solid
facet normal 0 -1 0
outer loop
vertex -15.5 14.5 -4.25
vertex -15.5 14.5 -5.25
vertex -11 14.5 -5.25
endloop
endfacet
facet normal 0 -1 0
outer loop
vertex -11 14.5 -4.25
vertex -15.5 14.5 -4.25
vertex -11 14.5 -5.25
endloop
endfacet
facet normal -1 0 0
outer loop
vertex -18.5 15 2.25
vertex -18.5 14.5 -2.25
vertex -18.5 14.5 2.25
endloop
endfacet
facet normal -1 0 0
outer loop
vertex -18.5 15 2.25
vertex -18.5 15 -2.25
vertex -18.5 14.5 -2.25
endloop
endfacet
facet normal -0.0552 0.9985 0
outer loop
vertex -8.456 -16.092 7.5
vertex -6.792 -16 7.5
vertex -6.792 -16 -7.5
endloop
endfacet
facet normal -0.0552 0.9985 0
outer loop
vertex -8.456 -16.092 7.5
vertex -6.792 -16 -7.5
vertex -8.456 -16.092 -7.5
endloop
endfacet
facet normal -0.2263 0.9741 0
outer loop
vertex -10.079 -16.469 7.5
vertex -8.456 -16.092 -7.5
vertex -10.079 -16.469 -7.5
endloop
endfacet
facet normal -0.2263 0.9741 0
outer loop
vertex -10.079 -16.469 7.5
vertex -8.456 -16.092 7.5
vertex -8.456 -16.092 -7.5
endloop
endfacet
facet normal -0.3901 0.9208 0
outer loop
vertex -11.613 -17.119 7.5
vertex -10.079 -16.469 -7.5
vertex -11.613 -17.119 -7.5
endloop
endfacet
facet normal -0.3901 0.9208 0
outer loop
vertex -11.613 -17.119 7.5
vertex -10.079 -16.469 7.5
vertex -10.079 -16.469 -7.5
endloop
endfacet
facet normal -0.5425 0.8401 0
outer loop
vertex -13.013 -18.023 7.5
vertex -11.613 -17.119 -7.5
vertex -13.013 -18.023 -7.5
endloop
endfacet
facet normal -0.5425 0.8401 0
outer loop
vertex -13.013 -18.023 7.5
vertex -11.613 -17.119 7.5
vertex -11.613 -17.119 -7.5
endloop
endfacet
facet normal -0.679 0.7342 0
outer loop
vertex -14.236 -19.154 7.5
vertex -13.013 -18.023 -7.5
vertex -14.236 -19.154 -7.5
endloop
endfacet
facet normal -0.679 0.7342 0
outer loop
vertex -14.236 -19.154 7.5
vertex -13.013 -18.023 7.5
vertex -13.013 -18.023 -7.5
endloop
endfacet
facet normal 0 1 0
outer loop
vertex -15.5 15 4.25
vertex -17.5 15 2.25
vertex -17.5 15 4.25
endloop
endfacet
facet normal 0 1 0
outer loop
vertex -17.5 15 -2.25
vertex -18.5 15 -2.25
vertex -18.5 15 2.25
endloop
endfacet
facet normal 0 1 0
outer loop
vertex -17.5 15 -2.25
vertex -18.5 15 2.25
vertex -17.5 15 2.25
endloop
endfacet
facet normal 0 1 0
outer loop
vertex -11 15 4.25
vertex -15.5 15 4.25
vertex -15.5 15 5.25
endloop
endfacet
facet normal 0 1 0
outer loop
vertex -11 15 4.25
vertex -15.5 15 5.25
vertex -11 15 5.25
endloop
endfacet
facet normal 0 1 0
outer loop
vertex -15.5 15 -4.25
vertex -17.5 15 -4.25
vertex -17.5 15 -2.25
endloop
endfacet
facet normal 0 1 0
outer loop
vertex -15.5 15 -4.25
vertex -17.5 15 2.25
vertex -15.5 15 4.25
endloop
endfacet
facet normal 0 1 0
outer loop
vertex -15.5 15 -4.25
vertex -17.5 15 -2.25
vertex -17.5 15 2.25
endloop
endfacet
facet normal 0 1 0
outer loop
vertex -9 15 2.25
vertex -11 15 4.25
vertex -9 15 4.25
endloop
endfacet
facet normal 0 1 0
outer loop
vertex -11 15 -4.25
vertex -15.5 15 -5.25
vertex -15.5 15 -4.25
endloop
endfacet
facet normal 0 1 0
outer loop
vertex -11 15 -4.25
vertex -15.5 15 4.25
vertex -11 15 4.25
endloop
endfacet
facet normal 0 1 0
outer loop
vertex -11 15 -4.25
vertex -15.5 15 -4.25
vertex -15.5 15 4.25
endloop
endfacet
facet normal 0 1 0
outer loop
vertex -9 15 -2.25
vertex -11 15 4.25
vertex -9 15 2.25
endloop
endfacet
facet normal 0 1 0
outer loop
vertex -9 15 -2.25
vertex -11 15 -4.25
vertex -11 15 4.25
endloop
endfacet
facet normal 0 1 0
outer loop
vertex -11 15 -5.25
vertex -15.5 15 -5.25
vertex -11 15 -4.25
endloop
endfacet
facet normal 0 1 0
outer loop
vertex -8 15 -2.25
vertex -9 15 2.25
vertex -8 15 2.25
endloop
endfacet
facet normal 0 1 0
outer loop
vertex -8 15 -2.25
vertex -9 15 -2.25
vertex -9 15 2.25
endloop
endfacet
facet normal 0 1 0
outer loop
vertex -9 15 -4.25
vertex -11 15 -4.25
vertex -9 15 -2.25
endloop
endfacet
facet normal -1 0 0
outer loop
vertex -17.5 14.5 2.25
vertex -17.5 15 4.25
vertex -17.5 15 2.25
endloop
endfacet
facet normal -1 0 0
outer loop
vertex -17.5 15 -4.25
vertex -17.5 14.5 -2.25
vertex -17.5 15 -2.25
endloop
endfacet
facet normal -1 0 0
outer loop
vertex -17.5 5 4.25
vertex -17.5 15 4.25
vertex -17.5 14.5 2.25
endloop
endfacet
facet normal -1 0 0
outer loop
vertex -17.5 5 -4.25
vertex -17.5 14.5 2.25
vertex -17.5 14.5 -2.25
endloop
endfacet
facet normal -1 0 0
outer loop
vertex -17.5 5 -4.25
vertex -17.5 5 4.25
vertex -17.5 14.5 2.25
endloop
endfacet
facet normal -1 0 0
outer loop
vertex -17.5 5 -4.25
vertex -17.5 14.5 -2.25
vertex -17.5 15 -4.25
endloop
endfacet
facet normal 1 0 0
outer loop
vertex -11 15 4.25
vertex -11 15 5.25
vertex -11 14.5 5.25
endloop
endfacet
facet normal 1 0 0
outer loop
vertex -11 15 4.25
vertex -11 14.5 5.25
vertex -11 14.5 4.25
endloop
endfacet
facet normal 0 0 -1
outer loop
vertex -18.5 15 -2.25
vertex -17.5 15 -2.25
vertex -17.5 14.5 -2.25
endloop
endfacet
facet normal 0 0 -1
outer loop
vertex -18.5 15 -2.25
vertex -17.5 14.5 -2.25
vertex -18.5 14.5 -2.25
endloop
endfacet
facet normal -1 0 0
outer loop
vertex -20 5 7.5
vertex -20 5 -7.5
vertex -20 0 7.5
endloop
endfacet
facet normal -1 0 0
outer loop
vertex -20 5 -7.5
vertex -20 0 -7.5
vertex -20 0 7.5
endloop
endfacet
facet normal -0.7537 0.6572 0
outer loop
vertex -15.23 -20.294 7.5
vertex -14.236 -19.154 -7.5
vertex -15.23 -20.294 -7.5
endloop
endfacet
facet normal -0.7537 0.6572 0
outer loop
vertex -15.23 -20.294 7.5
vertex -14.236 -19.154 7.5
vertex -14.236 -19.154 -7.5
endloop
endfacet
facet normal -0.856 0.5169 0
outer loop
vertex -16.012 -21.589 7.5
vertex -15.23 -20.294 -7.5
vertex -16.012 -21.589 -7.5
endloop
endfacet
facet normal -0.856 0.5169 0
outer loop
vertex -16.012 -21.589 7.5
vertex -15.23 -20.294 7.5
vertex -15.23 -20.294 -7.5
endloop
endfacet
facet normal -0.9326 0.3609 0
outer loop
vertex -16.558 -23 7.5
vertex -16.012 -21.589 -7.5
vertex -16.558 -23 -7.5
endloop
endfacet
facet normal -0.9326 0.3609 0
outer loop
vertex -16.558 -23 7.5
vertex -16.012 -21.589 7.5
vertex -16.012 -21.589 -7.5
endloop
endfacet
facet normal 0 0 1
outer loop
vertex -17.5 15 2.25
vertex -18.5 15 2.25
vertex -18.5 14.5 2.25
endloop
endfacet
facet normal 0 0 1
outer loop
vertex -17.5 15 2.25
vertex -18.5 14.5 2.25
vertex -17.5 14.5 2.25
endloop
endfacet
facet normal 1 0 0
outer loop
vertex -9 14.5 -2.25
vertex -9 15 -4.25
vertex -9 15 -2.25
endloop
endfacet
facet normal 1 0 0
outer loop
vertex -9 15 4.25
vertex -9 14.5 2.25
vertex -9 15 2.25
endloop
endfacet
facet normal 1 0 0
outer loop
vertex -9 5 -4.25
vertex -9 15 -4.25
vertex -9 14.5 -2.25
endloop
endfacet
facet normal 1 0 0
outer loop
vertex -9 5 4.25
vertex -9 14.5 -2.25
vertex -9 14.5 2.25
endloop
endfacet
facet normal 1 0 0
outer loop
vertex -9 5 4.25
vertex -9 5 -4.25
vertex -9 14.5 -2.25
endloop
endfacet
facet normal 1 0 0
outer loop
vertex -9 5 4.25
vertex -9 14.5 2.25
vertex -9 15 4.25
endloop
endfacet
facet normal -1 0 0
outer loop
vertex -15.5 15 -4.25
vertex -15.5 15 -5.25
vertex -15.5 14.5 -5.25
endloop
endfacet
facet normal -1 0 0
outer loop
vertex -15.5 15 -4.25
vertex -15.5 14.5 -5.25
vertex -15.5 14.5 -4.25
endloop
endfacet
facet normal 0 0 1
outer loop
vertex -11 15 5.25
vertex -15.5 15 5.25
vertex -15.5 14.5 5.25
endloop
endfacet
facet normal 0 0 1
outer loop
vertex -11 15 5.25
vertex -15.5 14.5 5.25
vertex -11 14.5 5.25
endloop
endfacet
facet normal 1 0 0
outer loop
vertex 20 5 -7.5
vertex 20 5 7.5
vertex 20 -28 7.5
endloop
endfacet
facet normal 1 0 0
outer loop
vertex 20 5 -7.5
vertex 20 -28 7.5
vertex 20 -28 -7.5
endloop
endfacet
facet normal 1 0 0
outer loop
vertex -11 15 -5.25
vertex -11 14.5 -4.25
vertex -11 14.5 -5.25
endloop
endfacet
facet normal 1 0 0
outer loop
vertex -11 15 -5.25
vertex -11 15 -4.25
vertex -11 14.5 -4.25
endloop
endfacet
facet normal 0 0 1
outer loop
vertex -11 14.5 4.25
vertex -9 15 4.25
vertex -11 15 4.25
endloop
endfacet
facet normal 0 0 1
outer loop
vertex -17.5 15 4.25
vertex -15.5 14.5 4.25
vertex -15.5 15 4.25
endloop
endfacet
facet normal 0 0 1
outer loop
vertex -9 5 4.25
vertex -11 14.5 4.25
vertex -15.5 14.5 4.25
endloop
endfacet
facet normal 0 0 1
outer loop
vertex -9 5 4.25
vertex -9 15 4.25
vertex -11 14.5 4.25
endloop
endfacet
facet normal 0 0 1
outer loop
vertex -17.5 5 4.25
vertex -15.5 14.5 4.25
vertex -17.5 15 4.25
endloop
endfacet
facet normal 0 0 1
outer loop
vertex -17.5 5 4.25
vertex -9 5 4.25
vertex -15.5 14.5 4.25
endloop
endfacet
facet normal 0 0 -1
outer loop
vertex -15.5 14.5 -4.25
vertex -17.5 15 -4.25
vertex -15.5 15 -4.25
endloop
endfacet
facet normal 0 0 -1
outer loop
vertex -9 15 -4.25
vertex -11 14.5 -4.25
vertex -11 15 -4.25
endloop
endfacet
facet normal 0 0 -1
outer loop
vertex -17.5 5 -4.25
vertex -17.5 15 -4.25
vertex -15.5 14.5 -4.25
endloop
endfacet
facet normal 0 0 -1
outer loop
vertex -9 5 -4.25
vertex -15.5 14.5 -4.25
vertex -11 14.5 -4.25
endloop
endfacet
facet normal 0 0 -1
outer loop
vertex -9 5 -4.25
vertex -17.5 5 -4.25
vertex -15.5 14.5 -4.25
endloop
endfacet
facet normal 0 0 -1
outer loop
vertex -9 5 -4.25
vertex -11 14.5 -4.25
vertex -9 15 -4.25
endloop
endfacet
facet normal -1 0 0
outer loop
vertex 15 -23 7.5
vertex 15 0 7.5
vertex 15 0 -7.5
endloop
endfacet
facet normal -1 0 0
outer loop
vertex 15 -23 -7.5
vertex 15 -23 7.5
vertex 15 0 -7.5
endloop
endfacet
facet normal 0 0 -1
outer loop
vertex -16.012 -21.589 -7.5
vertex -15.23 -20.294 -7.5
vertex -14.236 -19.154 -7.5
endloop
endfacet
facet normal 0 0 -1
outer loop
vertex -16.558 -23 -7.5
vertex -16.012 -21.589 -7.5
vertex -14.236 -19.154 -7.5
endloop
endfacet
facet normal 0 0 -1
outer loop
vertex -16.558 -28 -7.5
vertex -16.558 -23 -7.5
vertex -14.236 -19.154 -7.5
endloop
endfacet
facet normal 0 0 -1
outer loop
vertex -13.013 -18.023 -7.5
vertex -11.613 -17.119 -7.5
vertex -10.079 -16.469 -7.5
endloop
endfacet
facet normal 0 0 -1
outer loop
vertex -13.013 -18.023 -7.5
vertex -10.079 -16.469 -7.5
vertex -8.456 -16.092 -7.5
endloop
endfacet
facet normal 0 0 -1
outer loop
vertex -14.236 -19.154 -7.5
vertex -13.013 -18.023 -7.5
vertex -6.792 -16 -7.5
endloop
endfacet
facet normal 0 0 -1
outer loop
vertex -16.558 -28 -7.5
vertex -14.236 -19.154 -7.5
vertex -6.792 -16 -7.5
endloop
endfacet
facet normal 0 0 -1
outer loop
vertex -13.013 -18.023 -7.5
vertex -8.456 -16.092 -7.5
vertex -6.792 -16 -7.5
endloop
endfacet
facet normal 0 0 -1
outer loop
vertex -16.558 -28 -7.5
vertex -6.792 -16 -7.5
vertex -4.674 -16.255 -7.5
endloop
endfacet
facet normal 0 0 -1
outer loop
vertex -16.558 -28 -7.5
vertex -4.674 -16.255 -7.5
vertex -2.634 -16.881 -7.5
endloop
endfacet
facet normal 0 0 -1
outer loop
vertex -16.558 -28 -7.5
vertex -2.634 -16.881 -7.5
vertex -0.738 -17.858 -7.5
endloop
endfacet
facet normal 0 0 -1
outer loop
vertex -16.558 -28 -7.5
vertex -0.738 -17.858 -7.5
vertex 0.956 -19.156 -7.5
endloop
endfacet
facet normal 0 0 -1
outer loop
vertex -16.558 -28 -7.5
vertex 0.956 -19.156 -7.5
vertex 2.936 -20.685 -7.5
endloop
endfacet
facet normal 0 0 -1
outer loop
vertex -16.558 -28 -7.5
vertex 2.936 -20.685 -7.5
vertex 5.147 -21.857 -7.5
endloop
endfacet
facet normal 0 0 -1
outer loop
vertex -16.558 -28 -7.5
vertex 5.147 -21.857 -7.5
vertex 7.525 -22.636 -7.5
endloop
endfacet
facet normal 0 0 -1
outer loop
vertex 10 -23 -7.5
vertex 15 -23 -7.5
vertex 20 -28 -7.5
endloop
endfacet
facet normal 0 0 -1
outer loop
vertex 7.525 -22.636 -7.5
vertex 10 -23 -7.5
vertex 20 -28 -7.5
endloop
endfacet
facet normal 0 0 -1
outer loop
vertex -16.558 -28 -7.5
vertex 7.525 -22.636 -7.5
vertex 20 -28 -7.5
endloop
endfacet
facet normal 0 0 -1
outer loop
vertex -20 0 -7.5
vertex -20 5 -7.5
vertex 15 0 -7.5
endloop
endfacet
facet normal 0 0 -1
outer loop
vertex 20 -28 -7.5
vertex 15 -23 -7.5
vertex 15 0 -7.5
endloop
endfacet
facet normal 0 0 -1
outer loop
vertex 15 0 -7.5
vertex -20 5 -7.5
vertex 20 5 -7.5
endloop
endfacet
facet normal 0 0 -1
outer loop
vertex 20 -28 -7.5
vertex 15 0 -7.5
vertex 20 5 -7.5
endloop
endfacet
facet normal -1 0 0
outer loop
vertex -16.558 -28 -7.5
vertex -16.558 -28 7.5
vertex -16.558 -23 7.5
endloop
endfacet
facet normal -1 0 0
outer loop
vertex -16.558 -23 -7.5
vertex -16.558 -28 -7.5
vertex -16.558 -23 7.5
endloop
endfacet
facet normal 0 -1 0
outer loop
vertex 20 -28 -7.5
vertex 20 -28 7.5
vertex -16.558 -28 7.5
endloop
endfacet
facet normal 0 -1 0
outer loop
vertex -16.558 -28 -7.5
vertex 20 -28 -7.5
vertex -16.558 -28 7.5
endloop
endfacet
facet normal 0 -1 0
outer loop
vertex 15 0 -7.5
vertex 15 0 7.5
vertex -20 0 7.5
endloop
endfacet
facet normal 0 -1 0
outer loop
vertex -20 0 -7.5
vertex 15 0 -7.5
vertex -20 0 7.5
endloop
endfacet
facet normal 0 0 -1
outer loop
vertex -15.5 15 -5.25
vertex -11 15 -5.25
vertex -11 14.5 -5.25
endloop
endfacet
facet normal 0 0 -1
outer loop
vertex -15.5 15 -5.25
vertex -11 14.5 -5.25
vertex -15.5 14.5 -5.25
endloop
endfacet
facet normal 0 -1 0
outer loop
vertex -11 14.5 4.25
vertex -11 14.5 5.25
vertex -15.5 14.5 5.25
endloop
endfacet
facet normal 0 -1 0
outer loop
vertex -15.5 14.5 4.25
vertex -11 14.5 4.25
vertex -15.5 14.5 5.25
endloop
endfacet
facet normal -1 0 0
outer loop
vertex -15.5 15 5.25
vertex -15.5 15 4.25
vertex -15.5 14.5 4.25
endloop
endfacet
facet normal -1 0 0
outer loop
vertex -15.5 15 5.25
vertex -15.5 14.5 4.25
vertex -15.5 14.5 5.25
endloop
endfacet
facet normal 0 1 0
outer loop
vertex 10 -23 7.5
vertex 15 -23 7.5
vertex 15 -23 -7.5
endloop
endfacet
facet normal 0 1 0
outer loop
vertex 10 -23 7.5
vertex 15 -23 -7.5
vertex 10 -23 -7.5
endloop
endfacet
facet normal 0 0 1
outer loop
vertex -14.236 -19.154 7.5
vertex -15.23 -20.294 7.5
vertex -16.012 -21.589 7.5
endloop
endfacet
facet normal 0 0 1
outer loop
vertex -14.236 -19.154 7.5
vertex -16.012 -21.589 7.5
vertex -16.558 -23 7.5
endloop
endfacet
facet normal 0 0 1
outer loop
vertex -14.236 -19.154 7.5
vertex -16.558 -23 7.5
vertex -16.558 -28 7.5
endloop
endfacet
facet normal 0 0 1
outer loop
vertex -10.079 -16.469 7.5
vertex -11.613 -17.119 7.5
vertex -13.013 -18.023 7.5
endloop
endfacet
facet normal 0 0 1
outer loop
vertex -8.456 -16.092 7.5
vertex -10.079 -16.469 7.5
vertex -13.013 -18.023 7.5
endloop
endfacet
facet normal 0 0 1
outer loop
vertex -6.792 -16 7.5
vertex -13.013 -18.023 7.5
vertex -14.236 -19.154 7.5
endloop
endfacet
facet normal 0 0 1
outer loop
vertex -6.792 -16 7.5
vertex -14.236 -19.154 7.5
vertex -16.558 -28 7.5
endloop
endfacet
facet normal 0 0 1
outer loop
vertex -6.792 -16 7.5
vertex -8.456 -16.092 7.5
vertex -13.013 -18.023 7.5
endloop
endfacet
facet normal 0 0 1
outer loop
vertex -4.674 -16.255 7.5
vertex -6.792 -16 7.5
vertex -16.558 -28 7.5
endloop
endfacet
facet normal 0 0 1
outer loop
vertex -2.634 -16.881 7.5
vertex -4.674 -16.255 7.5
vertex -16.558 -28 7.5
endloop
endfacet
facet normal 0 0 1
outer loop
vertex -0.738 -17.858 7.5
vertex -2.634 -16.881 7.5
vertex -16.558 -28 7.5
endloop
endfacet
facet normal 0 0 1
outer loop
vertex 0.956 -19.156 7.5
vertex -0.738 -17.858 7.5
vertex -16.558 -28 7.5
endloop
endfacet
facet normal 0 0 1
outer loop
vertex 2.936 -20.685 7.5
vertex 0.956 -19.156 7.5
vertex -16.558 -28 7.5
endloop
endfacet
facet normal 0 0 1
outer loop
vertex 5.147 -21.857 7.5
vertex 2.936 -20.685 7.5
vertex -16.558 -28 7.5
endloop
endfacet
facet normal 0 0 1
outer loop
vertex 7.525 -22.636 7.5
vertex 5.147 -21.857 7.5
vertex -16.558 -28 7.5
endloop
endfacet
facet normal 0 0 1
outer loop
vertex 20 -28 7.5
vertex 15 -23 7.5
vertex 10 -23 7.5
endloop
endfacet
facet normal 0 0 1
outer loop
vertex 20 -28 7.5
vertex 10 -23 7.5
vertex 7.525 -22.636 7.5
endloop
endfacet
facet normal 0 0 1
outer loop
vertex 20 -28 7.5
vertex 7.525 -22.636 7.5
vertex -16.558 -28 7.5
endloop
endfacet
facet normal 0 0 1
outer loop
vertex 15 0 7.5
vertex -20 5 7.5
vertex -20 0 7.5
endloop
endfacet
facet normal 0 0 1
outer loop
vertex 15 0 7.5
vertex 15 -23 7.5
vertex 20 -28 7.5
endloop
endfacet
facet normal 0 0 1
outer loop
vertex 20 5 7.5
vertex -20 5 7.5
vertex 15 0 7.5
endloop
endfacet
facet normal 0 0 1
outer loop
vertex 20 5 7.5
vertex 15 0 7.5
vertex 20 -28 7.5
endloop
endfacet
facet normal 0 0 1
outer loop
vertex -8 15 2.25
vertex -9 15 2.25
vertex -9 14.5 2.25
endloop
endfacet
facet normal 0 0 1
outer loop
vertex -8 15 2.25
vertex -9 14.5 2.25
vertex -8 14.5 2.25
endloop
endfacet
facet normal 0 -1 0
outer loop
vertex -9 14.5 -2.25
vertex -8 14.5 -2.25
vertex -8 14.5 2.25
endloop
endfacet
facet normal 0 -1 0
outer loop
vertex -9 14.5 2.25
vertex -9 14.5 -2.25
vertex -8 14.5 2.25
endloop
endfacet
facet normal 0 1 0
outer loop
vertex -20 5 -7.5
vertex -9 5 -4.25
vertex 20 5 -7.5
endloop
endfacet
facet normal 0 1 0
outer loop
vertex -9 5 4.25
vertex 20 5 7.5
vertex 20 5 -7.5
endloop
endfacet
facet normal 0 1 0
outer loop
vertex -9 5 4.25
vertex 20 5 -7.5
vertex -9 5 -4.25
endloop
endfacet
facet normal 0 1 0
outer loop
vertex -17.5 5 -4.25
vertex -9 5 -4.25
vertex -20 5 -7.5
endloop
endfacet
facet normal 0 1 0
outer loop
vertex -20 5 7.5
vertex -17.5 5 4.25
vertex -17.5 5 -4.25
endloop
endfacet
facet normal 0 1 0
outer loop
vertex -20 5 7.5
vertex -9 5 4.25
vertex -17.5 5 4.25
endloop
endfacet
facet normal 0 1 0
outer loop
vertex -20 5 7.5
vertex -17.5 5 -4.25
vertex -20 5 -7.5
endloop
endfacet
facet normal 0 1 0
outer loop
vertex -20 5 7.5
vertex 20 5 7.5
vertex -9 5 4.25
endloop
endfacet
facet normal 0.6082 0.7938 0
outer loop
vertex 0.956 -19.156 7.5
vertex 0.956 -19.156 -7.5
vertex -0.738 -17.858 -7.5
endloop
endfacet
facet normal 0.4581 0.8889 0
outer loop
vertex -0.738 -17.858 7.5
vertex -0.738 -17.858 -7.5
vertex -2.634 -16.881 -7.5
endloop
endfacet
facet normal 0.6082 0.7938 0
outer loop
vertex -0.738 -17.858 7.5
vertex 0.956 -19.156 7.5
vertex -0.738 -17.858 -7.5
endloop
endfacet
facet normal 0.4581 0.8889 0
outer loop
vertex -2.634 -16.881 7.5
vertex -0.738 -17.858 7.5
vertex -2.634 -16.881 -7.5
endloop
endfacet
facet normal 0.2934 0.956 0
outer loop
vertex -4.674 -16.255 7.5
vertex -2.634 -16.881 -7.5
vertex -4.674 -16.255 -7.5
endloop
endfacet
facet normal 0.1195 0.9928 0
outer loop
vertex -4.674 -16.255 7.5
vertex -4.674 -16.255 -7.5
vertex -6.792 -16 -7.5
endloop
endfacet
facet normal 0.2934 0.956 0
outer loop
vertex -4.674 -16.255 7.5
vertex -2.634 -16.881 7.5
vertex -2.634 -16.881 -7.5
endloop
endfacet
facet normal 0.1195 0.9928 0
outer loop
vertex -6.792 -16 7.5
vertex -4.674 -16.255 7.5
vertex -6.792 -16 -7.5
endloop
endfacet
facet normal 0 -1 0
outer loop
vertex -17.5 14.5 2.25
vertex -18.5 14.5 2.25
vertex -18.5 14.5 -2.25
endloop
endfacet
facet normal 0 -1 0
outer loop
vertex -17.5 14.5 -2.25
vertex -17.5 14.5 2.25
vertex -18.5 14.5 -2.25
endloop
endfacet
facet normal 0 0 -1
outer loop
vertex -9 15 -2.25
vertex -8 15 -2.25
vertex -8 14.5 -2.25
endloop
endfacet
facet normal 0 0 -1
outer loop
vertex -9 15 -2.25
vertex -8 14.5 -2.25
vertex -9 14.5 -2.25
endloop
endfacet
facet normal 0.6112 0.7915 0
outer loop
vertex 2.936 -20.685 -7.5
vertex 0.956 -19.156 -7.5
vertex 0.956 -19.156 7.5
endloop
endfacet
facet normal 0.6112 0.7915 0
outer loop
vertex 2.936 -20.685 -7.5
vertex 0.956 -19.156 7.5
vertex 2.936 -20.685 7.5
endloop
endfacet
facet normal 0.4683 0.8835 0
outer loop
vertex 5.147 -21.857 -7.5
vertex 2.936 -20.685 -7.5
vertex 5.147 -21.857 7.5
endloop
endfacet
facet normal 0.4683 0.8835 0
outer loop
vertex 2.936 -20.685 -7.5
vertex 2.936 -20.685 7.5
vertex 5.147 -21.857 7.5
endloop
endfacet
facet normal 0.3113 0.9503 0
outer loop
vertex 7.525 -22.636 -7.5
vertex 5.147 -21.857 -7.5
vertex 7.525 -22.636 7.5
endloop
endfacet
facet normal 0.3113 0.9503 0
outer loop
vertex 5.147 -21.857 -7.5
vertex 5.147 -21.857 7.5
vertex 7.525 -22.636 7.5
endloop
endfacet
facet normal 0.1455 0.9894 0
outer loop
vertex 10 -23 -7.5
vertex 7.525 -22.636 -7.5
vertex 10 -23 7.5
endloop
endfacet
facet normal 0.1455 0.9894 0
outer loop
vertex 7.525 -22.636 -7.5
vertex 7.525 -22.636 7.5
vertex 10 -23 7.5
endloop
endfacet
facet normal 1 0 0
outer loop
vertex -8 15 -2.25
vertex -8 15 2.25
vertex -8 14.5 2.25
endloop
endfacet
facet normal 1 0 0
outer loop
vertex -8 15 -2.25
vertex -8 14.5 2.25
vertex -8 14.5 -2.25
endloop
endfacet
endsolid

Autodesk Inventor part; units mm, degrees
ref_plane "YZ Plane" through (0, 0, 0) normal (1, 0, 0) x (0, 1, 0)
ref_plane "XZ Plane" through (0, 0, 0) normal (0, 1, 0) x (-1, 0, 0)
ref_plane "XY Plane" through (0, 0, 0) normal (0, 0, 1) x (1, 0, 0)
sketch "Sketch1" plane through (0, 0, 0) normal (0, 1, 0) x (-1, 0, 0)
  line L0 (-20, -7.5) -> (20, -7.5)
  line L1 (20, -7.5) -> (20, 7.5)
  line L2 (20, 7.5) -> (-20, 7.5)
  line L3 (-20, 7.5) -> (-20, -7.5)
  line L4 (-20, -7.5) -> (20, 7.5) construction
  line L5 (20, -7.5) -> (-20, 7.5) construction
  point P0 (0, 0)
  dimension "d0" = 15
  dimension "d1" = 40
extrude "Extrusion1" add sketch "Sketch1" along normal blind 5
sketch "Sketch2" plane through (20, 0, 7.5) normal (1, 0, 0) x (0, 0, -1)
  line L0 (15, 0) -> (0, 0) projected
  line L1 (0, -28) -> (0, 0)
  line L2 (15, 0) -> (15, -28)
  line L3 (15, -28) -> (0, -28)
  line L4 (0, 0) -> (15, 0) projected
  line L5 (15, 0) -> (0, 0)
  point P0 (7.5, 0)
  dimension "d13" = 28
extrude "Extrusion2" add sketch "Sketch2" against normal blind 5
sketch "Sketch3" plane through (-20, 5, 7.5) normal (0, 0, 1) x (1, 0, 0)
  line L0 (35, -5) -> (35, -33) projected
  line L1 (35, -33) -> (30, -33)
  line L2 (35, -28) -> (30, -28)
  line L3 (35, -25) -> (-4.3646, -25) construction
  line L4 (0, -5) -> (35, -5) construction
  line L5 (30, -33) -> (3.4423, -33)
  line L6 (35, -21) -> (-4.3646, -21) construction
  line L7 (3.4423, -33) -> (21.0714, -33)
  arc A0 (20.9558, -24.1562) -> (30, -28) centre (30.8945, -13.3333) ccw
  arc A1 (20.9558, -24.1562) -> (13.2077, -21) centre (12.838, -32.9961) ccw
  arc A2 (13.2077, -21) -> (5.7637, -24.1543) centre (12.91, -30.6583) ccw
  arc A3 (5.7637, -24.1543) -> (3.4423, -28) centre (11.7993, -30.4211) ccw
  line L8 (3.4423, -33) -> (3.4423, -28)
  point P0 (20, -5)
  point P1 (35, -5)
  dimension "d7" = 5
  dimension "d8" = 5
  dimension "d9" = 20
  dimension "d10" = 4
extrude "Extrusion3" add sketch "Sketch3" against normal up to surface (15 mm away)
sketch "Sketch4" plane through (0, 5, 0) normal (0, 1, 0) x (1, 0, 0)
  line L0 (-17.5, 4.25) -> (-9, 4.25)
  line L1 (-9, 4.25) -> (-9, -4.25)
  line L2 (-9, -4.25) -> (-17.5, -4.25)
  line L3 (-17.5, -4.25) -> (-17.5, 4.25)
  line L4 (-20, 7.5) -> (-20, -7.5) projected
  point P0 (0, 0)
  dimension "d14" = 8.5
  dimension "d15" = 2.5
  dimension "d16" = 4.25
  dimension "d17" = 4.25
extrude "Extrusion4" add sketch "Sketch4" along normal blind 10
sketch "Sketch5" plane through (0, 15, 0) normal (0, 1, 0) x (1, 0, 0)
  line L0 (-17.5, 4.25) -> (-9, 4.25) projected
  line L1 (-15.5, 4.25) -> (-11, 4.25)
  line L2 (-11, 4.25) -> (-11, 5.25)
  line L3 (-11, 5.25) -> (-15.5, 5.25)
  line L4 (-15.5, 5.25) -> (-15.5, 4.25)
  line L5 (-9, -4.25) -> (-9, 4.25) projected
  line L6 (-17.5, 4.25) -> (-17.5, -4.25) projected
  point P0 (0, 0)
  dimension "d20" = 2
  dimension "d21" = 2
  dimension "d22" = 1
extrude "Extrusion5" add sketch "Sketch5" against normal blind 0.5
sketch "Sketch6" plane through (0, 15, 0) normal (0, 1, 0) x (1, 0, 0)
  line L0 (-17.5, 4.25) -> (-9, 4.25) construction
  line L1 (-9, -4.25) -> (-9, 4.25) construction
  line L2 (-17.5, 4.25) -> (-9, -4.25) construction
  line L3 (-9, 4.25) -> (-17.5, -4.25) construction
  point P0 (0, 0)
  point P1 (-13.25, 0)
pattern_circular "Circular Pattern1" count 4 over 360 about axis through (-13.25, 15, 0) along (0, 1, 0) of "Extrusion5"
equation "\"d16\" = 0.5 * d14"
equation "\"d17\" = 0.5 * d14"
properties part number "GroundClipV1"
